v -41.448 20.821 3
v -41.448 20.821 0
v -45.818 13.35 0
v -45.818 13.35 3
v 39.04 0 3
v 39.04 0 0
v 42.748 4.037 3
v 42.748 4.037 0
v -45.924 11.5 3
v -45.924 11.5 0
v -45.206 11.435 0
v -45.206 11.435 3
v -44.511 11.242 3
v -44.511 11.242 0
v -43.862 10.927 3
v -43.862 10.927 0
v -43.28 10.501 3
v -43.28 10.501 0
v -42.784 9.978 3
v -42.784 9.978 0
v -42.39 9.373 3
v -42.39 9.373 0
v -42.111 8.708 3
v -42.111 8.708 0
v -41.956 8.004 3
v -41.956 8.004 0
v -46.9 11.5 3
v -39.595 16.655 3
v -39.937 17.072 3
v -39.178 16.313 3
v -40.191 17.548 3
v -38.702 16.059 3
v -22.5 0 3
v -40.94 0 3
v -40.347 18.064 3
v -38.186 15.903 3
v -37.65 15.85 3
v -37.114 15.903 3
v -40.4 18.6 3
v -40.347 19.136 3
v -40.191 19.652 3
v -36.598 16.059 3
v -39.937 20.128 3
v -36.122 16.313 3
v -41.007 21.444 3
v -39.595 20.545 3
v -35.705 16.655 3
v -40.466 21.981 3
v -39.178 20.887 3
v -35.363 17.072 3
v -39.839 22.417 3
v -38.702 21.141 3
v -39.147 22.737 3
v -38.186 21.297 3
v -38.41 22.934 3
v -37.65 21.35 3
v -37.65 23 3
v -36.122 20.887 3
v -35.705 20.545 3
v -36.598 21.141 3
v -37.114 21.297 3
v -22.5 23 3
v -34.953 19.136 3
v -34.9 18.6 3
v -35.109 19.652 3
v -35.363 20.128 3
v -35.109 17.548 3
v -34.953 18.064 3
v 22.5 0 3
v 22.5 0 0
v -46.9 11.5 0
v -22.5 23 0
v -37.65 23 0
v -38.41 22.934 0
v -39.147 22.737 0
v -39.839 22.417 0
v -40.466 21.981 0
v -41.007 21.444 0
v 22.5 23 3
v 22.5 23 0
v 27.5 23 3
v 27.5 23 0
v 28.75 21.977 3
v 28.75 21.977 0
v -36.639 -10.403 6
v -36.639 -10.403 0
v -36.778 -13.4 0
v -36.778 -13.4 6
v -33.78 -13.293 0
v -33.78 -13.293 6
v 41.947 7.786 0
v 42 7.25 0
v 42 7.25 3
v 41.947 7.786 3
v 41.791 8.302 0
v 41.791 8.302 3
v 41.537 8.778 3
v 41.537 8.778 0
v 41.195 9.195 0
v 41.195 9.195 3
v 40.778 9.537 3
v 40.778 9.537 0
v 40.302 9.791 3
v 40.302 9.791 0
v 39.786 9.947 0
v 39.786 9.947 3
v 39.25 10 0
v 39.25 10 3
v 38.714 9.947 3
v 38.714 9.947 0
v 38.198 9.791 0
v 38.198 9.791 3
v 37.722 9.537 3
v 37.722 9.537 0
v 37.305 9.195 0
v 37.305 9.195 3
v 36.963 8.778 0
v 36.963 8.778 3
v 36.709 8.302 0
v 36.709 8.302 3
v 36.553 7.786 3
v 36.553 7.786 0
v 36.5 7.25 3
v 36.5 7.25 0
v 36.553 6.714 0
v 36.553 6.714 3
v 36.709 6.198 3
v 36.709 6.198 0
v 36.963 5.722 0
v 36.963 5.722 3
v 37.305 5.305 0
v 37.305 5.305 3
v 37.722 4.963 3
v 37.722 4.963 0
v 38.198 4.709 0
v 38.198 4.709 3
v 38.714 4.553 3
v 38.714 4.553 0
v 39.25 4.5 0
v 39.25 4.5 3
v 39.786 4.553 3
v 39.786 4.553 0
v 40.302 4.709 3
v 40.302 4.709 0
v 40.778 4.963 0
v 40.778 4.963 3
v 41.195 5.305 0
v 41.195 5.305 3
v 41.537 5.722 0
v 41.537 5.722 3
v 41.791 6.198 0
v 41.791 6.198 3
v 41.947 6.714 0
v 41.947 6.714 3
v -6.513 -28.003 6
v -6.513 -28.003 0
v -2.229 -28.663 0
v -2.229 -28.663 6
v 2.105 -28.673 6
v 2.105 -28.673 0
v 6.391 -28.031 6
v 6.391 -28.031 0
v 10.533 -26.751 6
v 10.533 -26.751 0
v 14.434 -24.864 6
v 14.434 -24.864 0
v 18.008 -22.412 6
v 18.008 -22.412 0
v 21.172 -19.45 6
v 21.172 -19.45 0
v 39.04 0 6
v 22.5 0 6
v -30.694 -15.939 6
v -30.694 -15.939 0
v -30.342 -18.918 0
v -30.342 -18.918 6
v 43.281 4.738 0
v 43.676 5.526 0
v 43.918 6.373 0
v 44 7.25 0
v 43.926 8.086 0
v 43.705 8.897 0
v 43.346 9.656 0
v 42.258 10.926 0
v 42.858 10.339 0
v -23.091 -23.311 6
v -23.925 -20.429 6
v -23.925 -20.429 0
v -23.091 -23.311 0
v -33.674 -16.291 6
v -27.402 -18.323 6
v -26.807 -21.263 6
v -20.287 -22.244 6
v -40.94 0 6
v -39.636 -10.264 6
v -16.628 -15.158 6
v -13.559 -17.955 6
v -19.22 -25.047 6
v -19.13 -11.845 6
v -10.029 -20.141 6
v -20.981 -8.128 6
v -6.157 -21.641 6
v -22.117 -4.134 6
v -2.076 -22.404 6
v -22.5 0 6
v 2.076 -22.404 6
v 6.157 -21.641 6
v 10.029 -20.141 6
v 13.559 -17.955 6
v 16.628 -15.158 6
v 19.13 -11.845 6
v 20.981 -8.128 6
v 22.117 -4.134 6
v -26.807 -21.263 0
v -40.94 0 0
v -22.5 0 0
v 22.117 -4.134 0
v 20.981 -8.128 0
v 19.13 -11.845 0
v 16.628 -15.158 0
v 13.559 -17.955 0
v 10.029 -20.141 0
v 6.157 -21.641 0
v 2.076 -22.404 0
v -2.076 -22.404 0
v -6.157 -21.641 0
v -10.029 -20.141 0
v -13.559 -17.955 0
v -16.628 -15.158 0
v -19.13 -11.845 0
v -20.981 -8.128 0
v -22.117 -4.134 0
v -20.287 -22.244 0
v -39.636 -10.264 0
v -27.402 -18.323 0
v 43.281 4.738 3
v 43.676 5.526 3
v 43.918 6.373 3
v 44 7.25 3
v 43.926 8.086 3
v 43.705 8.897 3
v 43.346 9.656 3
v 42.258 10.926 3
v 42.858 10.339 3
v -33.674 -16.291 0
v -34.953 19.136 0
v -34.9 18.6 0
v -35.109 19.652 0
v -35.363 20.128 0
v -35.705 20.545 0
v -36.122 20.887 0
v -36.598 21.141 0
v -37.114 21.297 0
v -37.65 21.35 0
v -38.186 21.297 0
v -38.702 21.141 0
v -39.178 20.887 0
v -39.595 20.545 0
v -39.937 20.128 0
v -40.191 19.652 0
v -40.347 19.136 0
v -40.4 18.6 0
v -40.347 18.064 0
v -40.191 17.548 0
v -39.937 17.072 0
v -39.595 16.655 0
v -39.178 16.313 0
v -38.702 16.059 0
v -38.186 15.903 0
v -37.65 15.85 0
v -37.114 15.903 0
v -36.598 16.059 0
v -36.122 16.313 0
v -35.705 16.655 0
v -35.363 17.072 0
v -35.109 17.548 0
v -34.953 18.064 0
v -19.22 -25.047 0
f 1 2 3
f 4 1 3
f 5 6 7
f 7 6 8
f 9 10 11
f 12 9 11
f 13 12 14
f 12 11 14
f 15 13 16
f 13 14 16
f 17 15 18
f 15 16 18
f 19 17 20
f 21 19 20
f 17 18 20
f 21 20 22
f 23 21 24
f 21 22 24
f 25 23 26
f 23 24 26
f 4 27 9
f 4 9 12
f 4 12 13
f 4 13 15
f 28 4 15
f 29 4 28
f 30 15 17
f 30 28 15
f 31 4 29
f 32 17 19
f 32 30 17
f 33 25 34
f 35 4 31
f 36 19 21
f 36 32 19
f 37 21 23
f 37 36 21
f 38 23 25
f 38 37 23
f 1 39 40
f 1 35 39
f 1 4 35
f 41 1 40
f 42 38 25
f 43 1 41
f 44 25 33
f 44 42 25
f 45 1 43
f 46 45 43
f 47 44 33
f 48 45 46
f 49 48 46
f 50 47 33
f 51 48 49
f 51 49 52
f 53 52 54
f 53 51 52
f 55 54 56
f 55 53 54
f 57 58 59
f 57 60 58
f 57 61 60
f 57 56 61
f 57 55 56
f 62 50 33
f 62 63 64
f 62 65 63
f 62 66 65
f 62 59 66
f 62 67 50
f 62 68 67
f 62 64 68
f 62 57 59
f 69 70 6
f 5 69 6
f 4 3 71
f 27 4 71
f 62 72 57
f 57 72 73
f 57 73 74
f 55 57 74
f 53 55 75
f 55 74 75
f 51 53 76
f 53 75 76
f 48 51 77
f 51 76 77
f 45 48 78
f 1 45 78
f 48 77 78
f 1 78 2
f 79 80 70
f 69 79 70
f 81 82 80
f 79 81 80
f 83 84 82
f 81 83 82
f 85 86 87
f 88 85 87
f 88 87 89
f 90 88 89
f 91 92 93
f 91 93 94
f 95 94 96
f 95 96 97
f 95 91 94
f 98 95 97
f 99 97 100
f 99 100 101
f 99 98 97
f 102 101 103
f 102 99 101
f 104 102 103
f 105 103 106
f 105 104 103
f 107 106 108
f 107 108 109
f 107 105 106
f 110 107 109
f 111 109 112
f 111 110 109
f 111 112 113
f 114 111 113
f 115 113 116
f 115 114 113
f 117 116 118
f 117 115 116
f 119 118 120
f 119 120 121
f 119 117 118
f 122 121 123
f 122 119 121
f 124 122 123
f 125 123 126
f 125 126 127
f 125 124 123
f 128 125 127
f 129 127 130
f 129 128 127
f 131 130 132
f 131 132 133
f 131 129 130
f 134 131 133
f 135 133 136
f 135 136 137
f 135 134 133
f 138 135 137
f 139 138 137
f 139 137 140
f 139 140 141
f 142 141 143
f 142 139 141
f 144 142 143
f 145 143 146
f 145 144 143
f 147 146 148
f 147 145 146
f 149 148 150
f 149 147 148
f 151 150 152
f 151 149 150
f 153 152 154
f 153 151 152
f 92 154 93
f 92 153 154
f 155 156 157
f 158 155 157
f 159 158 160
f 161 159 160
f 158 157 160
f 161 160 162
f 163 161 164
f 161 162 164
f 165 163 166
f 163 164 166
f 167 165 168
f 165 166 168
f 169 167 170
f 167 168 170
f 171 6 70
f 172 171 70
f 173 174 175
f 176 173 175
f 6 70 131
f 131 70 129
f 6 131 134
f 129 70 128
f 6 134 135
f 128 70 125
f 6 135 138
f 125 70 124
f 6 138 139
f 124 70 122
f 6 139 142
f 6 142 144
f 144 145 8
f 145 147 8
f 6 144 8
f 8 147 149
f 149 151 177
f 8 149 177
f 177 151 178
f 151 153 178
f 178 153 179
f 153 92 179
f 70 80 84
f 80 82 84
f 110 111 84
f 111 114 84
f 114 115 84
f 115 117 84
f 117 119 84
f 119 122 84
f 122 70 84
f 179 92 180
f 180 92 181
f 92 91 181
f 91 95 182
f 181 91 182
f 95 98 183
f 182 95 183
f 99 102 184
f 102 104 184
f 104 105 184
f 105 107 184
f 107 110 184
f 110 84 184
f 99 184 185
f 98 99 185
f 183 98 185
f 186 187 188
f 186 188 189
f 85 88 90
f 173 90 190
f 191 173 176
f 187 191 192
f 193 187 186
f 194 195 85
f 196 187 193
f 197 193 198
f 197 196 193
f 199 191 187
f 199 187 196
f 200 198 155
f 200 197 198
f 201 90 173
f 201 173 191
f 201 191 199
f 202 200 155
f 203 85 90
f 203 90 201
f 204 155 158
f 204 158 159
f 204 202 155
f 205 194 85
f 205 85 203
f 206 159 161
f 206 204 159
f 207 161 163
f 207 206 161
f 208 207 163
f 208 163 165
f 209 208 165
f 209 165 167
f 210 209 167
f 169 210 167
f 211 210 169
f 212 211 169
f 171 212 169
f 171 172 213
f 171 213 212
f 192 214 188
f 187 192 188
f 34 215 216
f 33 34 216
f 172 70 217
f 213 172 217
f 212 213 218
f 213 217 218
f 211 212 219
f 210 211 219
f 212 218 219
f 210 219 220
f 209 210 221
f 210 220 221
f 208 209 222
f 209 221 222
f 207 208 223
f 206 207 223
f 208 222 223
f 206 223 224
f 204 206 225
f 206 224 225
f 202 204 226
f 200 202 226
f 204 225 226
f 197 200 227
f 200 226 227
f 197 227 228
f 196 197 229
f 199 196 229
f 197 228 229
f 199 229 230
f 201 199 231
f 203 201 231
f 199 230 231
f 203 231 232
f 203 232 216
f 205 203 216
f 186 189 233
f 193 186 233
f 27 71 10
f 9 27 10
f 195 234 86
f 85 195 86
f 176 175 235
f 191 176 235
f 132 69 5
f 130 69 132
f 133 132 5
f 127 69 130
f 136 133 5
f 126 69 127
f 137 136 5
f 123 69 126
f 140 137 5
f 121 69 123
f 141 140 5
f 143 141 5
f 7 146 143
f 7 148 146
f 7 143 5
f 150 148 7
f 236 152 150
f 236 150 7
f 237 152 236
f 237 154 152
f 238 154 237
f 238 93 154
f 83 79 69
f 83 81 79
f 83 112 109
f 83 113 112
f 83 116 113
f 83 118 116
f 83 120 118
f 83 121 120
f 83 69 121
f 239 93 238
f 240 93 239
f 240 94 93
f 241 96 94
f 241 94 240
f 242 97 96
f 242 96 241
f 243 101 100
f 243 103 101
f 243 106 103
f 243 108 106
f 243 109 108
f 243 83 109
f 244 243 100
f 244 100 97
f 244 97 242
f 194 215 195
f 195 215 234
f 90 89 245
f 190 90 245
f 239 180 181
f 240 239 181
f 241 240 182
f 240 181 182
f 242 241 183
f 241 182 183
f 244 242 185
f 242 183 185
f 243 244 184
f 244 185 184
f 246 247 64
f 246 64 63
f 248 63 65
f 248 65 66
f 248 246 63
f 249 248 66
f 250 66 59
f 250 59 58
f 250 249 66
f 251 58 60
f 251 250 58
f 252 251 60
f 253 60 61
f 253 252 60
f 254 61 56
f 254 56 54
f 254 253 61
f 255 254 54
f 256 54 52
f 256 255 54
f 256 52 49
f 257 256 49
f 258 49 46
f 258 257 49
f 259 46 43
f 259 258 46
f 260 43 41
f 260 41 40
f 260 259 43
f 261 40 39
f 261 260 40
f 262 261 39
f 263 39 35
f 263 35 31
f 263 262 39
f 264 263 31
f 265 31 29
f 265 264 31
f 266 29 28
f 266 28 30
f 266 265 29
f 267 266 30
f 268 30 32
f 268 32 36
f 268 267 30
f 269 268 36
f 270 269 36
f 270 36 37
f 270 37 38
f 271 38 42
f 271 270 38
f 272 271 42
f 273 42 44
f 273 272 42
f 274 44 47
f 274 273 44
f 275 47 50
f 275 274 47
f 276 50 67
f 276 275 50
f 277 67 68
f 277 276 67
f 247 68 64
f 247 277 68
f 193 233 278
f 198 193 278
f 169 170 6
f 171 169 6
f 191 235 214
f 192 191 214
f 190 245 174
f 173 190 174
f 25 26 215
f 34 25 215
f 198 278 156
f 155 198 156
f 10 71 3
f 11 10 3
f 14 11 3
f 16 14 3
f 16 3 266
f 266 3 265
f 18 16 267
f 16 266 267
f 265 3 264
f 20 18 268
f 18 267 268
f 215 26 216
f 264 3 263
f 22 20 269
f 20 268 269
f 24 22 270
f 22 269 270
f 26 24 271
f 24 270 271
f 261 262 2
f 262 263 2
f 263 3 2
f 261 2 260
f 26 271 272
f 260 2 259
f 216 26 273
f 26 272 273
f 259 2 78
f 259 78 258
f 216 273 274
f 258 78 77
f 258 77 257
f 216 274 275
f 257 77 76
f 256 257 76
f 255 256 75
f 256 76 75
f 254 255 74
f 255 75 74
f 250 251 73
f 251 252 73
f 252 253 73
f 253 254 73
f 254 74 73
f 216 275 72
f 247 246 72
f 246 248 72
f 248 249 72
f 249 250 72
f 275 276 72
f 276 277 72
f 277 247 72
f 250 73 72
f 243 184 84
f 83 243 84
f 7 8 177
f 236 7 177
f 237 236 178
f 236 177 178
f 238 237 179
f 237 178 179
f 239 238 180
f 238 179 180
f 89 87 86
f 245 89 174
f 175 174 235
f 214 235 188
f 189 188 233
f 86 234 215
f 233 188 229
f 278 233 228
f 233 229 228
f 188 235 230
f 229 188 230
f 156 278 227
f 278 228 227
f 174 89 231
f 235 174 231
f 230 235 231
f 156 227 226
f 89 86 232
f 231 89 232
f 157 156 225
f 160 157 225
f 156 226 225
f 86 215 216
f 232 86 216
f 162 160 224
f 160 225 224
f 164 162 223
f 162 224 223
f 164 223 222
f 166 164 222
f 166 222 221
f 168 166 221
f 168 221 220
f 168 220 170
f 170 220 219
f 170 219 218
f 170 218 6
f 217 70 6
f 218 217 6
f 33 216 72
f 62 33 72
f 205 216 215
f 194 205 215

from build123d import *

# Parameters (mm, degrees)
F0_W     = 6.25
F0_H     = 23
F0_R     = 2.75
F1_DEPTH = 3
F2_DEPTH = 6


with BuildPart() as f1:
    # F0 (on Top) → F1 (new body)
    with BuildSketch(Plane.XY):
        with BuildLine():
            Line((-40.939551, 0), (-28.75, 0))
            Line((-28.75, 0), (-28.75, 23))
            Line((-28.75, 23), (-37.65, 23))
            ThreePointArc((-37.65, 23), (-34.53873, 21.71127), (-33.25, 18.6))
            ThreePointArc((-33.25, 18.6), (-38.800765, 14.353149), (-41.448064, 20.821421))
            Line((-41.448064, 20.821421), (-45.817967, 13.35))
            Line((-45.817967, 13.35), (-46.9, 11.5))
            Line((-46.9, 11.5), (-45.924144, 11.5))
            ThreePointArc((-45.924144, 11.5), (-43.279881, 10.501311), (-41.956015, 8.003935))
            Line((-41.956015, 8.003935), (-40.939551, 0))
        make_face()
        with Locations((-25.625, 11.5)):
            Rectangle(F0_W, F0_H)
        Polygon((22.5, 23), (22.5, 0), (28.75, 0), (28.75, 21.977351), (27.5, 23), align=None)
        with BuildLine():
            Line((28.75, 21.977351), (28.75, 0))
            Line((28.75, 0), (39.039863, 0))
            Line((39.039863, 0), (42.748027, 4.036543))
            ThreePointArc((42.748027, 4.036543), (34.511981, 6.912841), (42.257741, 10.92641))
            Line((42.257741, 10.92641), (28.75, 21.977351))
        make_face()
        with BuildLine():
            ThreePointArc((44, 7.25), (43.542393, 9.284174), (42.257741, 10.92641))
            ThreePointArc((42.257741, 10.92641), (34.511981, 6.912841), (42.748027, 4.036543))
            ThreePointArc((42.748027, 4.036543), (43.675953, 5.525635), (44, 7.25))
        make_face()
        with Locations((39.25, 7.25)):
            Circle(F0_R, mode=Mode.SUBTRACT)
        with BuildLine():
            ThreePointArc((-33.25, 18.6), (-34.53873, 21.71127), (-37.65, 23))
            ThreePointArc((-37.65, 23), (-39.839263, 22.416691), (-41.448064, 20.821421))
            ThreePointArc((-41.448064, 20.821421), (-38.800765, 14.353149), (-33.25, 18.6))
        make_face()
        with Locations((-37.65, 18.6)):
            Circle(F0_R, mode=Mode.SUBTRACT)
    extrude(amount=F1_DEPTH)


with BuildPart() as f2:
    # F0 (on Top) → F2 (new body)
    with BuildSketch(Plane.XY):
        with BuildLine():
            ThreePointArc((-6.512559, -28.002662), (-22.514424, -17.879128), (-28.75, 0))
            Line((-28.75, 0), (-40.939551, 0))
            Line((-40.939551, 0), (-39.636106, -10.263707))
            Line((-39.636106, -10.263707), (-36.639335, -10.402867))
            Line((-36.639335, -10.402867), (-36.778495, -13.399638))
            Line((-36.778495, -13.399638), (-33.780399, -13.292778))
            Line((-33.780399, -13.292778), (-33.673539, -16.290875))
            Line((-33.673539, -16.290875), (-30.694281, -15.938714))
            Line((-30.694281, -15.938714), (-30.34212, -18.917973))
            Line((-30.34212, -18.917973), (-27.401735, -18.32288))
            Line((-27.401735, -18.32288), (-26.806642, -21.263265))
            Line((-26.806642, -21.263265), (-23.924906, -20.429242))
            Line((-23.924906, -20.429242), (-23.090882, -23.310978))
            Line((-23.090882, -23.310978), (-20.287175, -22.243634))
            Line((-20.287175, -22.243634), (-19.21983, -25.047341))
            Line((-19.21983, -25.047341), (-6.512559, -28.002662))
        make_face()
        with BuildLine():
            ThreePointArc((22.5, 0), (0, -22.5), (-22.5, 0))
            Line((-22.5, 0), (-28.75, 0))
            ThreePointArc((-28.75, 0), (-22.514424, -17.879128), (-6.512559, -28.002662))
            ThreePointArc((-6.512559, -28.002662), (8.486126, -27.46904), (21.172269, -19.449872))
            ThreePointArc((21.172269, -19.449872), (26.788666, -10.436948), (28.75, 0))
            Line((28.75, 0), (22.5, 0))
        make_face()
        with BuildLine():
            Line((39.039863, 0), (28.75, 0))
            ThreePointArc((28.75, 0), (26.788666, -10.436948), (21.172269, -19.449872))
            Line((21.172269, -19.449872), (39.039863, 0))
        make_face()
    extrude(amount=F2_DEPTH)


solid = Compound([f1.part, f2.part])
